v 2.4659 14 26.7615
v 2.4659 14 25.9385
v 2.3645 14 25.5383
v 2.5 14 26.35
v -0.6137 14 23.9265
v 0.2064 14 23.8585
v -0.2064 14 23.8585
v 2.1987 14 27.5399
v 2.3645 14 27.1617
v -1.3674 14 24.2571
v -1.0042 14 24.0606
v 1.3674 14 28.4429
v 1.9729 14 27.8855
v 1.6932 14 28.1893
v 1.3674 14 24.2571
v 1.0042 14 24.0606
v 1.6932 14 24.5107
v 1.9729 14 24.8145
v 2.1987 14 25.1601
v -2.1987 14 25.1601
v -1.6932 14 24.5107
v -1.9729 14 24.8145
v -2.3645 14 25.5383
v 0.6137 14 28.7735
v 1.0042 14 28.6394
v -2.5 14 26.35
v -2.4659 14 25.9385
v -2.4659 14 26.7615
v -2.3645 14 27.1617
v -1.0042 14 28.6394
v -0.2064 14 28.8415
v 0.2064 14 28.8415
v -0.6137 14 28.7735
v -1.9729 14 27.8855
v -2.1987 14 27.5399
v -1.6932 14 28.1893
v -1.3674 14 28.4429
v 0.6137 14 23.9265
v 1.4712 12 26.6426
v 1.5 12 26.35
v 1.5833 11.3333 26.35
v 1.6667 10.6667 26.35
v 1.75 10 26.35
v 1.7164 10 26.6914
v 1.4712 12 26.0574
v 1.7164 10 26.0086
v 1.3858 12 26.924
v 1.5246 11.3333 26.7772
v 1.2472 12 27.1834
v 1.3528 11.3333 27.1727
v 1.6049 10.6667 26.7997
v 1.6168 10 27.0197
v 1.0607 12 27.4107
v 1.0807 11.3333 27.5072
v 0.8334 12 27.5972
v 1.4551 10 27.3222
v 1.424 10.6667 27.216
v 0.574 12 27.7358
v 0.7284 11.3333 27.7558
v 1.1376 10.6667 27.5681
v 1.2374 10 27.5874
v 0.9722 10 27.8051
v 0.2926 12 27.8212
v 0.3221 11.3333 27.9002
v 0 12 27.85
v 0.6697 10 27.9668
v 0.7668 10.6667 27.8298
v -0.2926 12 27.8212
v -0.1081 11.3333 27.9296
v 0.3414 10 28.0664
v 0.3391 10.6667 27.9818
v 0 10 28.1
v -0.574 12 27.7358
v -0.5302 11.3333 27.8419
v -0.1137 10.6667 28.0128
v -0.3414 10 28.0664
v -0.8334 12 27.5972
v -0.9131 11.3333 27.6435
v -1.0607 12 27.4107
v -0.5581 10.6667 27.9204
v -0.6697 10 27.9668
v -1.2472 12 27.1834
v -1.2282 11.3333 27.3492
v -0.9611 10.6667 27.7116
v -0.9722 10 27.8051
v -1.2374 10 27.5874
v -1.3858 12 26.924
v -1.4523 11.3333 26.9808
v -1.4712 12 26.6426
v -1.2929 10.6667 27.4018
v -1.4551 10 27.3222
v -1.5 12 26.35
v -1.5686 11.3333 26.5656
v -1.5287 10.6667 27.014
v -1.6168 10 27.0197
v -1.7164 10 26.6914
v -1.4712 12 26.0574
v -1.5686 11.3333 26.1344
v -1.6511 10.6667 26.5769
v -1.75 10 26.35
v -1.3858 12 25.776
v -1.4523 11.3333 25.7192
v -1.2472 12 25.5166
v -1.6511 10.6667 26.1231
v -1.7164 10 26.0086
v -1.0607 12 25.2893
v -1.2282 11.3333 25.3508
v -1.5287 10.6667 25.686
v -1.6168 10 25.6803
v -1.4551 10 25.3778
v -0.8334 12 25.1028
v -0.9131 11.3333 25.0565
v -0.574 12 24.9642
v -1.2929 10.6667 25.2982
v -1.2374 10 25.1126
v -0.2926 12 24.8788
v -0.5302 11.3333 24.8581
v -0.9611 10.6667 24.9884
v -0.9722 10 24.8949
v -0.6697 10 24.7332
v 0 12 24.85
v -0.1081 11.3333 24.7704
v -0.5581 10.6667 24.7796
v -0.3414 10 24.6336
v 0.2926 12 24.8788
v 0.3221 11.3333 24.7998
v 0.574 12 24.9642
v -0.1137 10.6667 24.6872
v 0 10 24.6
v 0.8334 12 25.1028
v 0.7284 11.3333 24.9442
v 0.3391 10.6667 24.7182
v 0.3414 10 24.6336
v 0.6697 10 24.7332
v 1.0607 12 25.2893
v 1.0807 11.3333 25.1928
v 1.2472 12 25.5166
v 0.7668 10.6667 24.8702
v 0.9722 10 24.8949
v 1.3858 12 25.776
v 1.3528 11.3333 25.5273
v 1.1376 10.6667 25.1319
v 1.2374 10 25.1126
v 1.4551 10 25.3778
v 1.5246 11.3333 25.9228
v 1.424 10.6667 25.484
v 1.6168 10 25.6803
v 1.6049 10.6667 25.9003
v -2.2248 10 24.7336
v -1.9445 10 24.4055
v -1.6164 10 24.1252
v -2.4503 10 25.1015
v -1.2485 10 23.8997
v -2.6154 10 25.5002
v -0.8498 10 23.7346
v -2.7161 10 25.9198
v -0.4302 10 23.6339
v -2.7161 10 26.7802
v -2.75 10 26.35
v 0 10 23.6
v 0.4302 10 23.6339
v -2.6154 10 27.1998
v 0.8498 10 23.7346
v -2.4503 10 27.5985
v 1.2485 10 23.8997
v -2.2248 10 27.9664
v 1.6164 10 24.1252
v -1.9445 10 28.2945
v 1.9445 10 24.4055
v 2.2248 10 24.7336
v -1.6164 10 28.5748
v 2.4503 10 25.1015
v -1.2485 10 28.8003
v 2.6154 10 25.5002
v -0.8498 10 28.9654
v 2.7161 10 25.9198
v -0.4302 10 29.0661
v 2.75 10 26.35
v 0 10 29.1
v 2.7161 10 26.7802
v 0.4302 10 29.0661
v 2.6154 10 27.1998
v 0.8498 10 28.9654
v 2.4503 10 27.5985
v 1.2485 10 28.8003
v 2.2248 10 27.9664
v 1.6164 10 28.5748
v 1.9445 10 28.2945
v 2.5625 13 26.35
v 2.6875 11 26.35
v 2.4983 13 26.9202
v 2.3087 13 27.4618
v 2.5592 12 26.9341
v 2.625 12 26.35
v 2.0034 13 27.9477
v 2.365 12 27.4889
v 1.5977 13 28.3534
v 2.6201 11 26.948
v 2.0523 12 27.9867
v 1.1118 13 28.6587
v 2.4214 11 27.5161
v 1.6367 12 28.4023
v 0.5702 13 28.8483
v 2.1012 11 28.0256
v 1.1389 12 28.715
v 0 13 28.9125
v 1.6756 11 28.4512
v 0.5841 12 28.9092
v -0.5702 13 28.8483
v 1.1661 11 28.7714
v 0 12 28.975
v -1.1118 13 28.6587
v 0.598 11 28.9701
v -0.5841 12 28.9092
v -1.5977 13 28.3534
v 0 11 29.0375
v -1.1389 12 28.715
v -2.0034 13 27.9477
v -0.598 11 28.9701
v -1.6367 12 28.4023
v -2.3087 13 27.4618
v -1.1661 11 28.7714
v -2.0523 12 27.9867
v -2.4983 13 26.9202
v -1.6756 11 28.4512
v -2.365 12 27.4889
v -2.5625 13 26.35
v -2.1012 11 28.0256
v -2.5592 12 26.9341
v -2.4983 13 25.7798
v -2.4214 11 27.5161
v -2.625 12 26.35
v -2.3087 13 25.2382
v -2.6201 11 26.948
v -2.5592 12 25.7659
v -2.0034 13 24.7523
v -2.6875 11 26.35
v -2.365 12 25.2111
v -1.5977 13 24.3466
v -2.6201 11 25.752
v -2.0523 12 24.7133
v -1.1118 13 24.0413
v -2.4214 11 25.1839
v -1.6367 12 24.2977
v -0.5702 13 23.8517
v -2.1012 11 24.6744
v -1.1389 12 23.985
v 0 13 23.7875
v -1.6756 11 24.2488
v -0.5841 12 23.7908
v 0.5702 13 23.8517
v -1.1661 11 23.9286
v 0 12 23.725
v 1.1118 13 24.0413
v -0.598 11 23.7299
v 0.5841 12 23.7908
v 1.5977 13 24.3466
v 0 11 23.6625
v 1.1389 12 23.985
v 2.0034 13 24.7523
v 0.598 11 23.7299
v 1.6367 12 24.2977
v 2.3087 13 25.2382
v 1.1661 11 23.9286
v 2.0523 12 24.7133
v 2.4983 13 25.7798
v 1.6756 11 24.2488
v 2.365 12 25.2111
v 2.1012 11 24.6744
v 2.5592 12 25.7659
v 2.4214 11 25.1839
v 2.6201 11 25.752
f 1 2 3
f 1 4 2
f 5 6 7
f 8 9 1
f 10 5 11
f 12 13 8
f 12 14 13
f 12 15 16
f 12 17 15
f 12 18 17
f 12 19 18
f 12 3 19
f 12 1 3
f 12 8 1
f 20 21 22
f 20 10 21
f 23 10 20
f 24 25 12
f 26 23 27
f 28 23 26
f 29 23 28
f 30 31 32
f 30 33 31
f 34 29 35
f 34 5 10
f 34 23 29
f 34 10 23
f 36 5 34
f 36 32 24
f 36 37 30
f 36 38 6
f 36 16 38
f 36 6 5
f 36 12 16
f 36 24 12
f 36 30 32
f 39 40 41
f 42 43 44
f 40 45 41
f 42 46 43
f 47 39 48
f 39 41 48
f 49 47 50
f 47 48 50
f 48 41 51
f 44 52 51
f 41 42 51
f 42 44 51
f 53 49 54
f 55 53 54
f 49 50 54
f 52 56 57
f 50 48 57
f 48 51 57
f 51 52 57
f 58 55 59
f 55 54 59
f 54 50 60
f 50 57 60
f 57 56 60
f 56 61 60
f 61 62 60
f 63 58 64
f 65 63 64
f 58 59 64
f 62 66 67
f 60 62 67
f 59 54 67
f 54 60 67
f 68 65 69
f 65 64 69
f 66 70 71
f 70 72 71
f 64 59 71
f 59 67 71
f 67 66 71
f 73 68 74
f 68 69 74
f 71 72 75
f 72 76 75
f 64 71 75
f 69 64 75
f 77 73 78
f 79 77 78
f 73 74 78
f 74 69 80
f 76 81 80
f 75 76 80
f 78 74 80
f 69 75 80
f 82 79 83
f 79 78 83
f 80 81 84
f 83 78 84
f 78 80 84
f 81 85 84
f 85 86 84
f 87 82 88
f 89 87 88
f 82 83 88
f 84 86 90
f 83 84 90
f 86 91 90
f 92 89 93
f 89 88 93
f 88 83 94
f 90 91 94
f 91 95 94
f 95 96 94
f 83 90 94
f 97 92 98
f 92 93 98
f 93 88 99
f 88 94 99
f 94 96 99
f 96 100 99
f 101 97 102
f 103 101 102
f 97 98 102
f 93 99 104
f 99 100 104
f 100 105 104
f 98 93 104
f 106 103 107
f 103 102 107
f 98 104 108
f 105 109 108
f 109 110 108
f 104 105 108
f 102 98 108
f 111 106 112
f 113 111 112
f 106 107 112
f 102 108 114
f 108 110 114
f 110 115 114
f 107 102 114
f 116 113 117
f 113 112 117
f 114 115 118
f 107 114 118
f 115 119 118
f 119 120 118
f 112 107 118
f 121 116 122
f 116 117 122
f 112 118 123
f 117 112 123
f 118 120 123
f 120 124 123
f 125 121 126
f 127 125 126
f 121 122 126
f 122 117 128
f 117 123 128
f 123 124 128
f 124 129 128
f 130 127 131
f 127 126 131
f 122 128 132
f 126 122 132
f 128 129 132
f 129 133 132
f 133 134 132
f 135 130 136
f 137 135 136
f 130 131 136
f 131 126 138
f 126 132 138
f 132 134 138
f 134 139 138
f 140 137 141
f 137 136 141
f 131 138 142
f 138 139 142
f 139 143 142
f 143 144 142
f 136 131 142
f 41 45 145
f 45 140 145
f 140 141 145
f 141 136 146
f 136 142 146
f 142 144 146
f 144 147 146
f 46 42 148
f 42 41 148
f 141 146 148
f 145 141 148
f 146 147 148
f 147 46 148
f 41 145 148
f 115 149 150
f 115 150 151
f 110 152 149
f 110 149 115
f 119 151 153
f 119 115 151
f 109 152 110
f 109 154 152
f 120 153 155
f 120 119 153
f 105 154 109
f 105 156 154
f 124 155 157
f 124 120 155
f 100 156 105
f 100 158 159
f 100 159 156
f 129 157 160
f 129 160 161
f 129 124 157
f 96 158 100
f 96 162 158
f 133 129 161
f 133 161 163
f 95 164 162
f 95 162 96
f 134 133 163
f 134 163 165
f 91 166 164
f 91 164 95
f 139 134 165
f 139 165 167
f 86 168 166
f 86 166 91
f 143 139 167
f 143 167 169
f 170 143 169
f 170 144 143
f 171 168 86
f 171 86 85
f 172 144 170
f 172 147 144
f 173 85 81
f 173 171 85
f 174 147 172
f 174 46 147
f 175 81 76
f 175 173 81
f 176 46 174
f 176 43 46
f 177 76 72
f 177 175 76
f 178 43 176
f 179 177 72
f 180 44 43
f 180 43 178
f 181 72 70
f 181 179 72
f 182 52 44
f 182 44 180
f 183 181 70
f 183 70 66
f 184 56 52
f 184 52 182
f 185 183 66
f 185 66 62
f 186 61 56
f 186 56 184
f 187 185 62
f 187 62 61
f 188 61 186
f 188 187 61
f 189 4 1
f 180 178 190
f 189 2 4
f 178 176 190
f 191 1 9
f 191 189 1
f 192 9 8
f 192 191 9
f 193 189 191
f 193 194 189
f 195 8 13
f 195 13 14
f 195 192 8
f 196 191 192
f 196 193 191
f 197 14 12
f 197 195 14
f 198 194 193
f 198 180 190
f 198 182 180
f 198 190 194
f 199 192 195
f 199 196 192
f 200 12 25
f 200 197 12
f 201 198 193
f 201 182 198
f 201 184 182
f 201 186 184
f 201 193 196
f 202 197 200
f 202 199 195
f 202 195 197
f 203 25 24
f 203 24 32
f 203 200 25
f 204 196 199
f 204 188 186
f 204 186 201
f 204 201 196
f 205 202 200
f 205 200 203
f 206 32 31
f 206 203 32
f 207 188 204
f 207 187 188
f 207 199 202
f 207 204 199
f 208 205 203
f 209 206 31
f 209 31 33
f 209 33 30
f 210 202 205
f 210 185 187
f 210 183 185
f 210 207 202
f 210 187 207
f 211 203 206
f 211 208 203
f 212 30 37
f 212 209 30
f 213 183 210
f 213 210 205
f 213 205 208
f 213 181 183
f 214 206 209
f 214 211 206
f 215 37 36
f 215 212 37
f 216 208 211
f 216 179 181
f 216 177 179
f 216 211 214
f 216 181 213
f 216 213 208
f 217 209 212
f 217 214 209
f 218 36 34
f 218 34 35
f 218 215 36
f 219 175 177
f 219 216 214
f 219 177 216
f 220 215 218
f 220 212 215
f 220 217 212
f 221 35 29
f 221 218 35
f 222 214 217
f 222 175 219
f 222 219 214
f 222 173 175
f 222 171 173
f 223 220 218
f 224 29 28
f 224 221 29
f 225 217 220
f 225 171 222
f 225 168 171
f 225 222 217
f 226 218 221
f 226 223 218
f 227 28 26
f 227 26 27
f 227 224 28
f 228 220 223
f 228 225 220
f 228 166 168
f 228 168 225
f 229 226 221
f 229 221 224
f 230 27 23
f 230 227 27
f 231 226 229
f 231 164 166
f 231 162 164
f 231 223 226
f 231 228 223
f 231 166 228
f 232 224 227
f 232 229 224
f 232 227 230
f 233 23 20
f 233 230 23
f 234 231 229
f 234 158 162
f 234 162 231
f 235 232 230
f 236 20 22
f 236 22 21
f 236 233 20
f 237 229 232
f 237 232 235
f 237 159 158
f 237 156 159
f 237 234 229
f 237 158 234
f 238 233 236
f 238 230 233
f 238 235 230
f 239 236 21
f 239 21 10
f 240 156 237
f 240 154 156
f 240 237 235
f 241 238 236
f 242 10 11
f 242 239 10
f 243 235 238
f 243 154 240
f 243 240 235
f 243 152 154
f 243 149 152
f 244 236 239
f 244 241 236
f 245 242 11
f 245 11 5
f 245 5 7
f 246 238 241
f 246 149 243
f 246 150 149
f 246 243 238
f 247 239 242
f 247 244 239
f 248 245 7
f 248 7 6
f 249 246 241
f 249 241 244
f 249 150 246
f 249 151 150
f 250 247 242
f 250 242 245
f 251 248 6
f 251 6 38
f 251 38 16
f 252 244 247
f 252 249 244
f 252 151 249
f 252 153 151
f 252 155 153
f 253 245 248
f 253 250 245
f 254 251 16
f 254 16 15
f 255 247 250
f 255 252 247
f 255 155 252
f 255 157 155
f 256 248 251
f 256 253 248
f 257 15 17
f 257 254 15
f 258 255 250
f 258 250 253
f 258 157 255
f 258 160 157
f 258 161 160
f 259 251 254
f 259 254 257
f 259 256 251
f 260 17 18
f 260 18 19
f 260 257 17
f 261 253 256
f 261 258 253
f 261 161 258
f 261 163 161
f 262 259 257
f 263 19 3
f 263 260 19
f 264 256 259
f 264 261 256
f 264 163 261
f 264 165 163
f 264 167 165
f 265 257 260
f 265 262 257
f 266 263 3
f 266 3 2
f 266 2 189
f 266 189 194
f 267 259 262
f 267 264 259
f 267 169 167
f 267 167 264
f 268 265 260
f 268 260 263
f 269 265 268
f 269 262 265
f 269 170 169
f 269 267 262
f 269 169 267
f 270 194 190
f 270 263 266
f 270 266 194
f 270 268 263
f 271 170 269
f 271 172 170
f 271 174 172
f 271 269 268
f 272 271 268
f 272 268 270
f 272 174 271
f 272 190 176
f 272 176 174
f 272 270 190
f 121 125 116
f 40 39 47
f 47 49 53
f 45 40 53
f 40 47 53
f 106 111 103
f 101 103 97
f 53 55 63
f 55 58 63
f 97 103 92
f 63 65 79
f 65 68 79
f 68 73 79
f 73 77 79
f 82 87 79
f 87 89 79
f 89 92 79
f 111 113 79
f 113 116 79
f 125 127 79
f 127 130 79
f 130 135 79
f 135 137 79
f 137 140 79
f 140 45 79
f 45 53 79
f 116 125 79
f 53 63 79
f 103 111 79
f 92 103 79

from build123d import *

# Parameters (mm, degrees)
CONE_ROLL_ANGLE    = 90
CONE001_ROLL_ANGLE = 90


with BuildPart() as cone:
    # Cone → Cone (revolve)
    with BuildSketch(Plane.XZ):
        Polygon((0, 0), (1.5, 0), (1.75, 2), (0, 2), align=None)
    revolve(axis=Axis((0, 0, 0), (0, 0, 1)))


with BuildPart() as cone_1:
    # Cone roll: moved
    add(cone.part.rotate(Axis((0, 0, 0), (1, 0, 0)), CONE_ROLL_ANGLE))


with BuildPart() as cone_2:
    # Cone placement: moved
    add(cone_1.part.moved(Location((0, 12, 26.35))))


with BuildPart() as switch_cap:
    # Cone001 → Cone001 (revolve)
    with BuildSketch(Plane.XZ):
        Polygon((0, 0), (2.5, 0), (2.75, 4), (0, 4), align=None)
    revolve(axis=Axis((0, 0, 0), (0, 0, 1)))


with BuildPart() as switch_cap_1:
    # Cone001 roll: moved
    add(switch_cap.part.rotate(Axis((0, 0, 0), (1, 0, 0)), CONE001_ROLL_ANGLE))


with BuildPart() as switch_cap_2:
    # Cone001 placement: moved
    add(switch_cap_1.part.moved(Location((0, 14, 26.35))))

    # Cut012: cut Cone
    add(cone_2.part, mode=Mode.SUBTRACT)


solid = switch_cap_2.part
